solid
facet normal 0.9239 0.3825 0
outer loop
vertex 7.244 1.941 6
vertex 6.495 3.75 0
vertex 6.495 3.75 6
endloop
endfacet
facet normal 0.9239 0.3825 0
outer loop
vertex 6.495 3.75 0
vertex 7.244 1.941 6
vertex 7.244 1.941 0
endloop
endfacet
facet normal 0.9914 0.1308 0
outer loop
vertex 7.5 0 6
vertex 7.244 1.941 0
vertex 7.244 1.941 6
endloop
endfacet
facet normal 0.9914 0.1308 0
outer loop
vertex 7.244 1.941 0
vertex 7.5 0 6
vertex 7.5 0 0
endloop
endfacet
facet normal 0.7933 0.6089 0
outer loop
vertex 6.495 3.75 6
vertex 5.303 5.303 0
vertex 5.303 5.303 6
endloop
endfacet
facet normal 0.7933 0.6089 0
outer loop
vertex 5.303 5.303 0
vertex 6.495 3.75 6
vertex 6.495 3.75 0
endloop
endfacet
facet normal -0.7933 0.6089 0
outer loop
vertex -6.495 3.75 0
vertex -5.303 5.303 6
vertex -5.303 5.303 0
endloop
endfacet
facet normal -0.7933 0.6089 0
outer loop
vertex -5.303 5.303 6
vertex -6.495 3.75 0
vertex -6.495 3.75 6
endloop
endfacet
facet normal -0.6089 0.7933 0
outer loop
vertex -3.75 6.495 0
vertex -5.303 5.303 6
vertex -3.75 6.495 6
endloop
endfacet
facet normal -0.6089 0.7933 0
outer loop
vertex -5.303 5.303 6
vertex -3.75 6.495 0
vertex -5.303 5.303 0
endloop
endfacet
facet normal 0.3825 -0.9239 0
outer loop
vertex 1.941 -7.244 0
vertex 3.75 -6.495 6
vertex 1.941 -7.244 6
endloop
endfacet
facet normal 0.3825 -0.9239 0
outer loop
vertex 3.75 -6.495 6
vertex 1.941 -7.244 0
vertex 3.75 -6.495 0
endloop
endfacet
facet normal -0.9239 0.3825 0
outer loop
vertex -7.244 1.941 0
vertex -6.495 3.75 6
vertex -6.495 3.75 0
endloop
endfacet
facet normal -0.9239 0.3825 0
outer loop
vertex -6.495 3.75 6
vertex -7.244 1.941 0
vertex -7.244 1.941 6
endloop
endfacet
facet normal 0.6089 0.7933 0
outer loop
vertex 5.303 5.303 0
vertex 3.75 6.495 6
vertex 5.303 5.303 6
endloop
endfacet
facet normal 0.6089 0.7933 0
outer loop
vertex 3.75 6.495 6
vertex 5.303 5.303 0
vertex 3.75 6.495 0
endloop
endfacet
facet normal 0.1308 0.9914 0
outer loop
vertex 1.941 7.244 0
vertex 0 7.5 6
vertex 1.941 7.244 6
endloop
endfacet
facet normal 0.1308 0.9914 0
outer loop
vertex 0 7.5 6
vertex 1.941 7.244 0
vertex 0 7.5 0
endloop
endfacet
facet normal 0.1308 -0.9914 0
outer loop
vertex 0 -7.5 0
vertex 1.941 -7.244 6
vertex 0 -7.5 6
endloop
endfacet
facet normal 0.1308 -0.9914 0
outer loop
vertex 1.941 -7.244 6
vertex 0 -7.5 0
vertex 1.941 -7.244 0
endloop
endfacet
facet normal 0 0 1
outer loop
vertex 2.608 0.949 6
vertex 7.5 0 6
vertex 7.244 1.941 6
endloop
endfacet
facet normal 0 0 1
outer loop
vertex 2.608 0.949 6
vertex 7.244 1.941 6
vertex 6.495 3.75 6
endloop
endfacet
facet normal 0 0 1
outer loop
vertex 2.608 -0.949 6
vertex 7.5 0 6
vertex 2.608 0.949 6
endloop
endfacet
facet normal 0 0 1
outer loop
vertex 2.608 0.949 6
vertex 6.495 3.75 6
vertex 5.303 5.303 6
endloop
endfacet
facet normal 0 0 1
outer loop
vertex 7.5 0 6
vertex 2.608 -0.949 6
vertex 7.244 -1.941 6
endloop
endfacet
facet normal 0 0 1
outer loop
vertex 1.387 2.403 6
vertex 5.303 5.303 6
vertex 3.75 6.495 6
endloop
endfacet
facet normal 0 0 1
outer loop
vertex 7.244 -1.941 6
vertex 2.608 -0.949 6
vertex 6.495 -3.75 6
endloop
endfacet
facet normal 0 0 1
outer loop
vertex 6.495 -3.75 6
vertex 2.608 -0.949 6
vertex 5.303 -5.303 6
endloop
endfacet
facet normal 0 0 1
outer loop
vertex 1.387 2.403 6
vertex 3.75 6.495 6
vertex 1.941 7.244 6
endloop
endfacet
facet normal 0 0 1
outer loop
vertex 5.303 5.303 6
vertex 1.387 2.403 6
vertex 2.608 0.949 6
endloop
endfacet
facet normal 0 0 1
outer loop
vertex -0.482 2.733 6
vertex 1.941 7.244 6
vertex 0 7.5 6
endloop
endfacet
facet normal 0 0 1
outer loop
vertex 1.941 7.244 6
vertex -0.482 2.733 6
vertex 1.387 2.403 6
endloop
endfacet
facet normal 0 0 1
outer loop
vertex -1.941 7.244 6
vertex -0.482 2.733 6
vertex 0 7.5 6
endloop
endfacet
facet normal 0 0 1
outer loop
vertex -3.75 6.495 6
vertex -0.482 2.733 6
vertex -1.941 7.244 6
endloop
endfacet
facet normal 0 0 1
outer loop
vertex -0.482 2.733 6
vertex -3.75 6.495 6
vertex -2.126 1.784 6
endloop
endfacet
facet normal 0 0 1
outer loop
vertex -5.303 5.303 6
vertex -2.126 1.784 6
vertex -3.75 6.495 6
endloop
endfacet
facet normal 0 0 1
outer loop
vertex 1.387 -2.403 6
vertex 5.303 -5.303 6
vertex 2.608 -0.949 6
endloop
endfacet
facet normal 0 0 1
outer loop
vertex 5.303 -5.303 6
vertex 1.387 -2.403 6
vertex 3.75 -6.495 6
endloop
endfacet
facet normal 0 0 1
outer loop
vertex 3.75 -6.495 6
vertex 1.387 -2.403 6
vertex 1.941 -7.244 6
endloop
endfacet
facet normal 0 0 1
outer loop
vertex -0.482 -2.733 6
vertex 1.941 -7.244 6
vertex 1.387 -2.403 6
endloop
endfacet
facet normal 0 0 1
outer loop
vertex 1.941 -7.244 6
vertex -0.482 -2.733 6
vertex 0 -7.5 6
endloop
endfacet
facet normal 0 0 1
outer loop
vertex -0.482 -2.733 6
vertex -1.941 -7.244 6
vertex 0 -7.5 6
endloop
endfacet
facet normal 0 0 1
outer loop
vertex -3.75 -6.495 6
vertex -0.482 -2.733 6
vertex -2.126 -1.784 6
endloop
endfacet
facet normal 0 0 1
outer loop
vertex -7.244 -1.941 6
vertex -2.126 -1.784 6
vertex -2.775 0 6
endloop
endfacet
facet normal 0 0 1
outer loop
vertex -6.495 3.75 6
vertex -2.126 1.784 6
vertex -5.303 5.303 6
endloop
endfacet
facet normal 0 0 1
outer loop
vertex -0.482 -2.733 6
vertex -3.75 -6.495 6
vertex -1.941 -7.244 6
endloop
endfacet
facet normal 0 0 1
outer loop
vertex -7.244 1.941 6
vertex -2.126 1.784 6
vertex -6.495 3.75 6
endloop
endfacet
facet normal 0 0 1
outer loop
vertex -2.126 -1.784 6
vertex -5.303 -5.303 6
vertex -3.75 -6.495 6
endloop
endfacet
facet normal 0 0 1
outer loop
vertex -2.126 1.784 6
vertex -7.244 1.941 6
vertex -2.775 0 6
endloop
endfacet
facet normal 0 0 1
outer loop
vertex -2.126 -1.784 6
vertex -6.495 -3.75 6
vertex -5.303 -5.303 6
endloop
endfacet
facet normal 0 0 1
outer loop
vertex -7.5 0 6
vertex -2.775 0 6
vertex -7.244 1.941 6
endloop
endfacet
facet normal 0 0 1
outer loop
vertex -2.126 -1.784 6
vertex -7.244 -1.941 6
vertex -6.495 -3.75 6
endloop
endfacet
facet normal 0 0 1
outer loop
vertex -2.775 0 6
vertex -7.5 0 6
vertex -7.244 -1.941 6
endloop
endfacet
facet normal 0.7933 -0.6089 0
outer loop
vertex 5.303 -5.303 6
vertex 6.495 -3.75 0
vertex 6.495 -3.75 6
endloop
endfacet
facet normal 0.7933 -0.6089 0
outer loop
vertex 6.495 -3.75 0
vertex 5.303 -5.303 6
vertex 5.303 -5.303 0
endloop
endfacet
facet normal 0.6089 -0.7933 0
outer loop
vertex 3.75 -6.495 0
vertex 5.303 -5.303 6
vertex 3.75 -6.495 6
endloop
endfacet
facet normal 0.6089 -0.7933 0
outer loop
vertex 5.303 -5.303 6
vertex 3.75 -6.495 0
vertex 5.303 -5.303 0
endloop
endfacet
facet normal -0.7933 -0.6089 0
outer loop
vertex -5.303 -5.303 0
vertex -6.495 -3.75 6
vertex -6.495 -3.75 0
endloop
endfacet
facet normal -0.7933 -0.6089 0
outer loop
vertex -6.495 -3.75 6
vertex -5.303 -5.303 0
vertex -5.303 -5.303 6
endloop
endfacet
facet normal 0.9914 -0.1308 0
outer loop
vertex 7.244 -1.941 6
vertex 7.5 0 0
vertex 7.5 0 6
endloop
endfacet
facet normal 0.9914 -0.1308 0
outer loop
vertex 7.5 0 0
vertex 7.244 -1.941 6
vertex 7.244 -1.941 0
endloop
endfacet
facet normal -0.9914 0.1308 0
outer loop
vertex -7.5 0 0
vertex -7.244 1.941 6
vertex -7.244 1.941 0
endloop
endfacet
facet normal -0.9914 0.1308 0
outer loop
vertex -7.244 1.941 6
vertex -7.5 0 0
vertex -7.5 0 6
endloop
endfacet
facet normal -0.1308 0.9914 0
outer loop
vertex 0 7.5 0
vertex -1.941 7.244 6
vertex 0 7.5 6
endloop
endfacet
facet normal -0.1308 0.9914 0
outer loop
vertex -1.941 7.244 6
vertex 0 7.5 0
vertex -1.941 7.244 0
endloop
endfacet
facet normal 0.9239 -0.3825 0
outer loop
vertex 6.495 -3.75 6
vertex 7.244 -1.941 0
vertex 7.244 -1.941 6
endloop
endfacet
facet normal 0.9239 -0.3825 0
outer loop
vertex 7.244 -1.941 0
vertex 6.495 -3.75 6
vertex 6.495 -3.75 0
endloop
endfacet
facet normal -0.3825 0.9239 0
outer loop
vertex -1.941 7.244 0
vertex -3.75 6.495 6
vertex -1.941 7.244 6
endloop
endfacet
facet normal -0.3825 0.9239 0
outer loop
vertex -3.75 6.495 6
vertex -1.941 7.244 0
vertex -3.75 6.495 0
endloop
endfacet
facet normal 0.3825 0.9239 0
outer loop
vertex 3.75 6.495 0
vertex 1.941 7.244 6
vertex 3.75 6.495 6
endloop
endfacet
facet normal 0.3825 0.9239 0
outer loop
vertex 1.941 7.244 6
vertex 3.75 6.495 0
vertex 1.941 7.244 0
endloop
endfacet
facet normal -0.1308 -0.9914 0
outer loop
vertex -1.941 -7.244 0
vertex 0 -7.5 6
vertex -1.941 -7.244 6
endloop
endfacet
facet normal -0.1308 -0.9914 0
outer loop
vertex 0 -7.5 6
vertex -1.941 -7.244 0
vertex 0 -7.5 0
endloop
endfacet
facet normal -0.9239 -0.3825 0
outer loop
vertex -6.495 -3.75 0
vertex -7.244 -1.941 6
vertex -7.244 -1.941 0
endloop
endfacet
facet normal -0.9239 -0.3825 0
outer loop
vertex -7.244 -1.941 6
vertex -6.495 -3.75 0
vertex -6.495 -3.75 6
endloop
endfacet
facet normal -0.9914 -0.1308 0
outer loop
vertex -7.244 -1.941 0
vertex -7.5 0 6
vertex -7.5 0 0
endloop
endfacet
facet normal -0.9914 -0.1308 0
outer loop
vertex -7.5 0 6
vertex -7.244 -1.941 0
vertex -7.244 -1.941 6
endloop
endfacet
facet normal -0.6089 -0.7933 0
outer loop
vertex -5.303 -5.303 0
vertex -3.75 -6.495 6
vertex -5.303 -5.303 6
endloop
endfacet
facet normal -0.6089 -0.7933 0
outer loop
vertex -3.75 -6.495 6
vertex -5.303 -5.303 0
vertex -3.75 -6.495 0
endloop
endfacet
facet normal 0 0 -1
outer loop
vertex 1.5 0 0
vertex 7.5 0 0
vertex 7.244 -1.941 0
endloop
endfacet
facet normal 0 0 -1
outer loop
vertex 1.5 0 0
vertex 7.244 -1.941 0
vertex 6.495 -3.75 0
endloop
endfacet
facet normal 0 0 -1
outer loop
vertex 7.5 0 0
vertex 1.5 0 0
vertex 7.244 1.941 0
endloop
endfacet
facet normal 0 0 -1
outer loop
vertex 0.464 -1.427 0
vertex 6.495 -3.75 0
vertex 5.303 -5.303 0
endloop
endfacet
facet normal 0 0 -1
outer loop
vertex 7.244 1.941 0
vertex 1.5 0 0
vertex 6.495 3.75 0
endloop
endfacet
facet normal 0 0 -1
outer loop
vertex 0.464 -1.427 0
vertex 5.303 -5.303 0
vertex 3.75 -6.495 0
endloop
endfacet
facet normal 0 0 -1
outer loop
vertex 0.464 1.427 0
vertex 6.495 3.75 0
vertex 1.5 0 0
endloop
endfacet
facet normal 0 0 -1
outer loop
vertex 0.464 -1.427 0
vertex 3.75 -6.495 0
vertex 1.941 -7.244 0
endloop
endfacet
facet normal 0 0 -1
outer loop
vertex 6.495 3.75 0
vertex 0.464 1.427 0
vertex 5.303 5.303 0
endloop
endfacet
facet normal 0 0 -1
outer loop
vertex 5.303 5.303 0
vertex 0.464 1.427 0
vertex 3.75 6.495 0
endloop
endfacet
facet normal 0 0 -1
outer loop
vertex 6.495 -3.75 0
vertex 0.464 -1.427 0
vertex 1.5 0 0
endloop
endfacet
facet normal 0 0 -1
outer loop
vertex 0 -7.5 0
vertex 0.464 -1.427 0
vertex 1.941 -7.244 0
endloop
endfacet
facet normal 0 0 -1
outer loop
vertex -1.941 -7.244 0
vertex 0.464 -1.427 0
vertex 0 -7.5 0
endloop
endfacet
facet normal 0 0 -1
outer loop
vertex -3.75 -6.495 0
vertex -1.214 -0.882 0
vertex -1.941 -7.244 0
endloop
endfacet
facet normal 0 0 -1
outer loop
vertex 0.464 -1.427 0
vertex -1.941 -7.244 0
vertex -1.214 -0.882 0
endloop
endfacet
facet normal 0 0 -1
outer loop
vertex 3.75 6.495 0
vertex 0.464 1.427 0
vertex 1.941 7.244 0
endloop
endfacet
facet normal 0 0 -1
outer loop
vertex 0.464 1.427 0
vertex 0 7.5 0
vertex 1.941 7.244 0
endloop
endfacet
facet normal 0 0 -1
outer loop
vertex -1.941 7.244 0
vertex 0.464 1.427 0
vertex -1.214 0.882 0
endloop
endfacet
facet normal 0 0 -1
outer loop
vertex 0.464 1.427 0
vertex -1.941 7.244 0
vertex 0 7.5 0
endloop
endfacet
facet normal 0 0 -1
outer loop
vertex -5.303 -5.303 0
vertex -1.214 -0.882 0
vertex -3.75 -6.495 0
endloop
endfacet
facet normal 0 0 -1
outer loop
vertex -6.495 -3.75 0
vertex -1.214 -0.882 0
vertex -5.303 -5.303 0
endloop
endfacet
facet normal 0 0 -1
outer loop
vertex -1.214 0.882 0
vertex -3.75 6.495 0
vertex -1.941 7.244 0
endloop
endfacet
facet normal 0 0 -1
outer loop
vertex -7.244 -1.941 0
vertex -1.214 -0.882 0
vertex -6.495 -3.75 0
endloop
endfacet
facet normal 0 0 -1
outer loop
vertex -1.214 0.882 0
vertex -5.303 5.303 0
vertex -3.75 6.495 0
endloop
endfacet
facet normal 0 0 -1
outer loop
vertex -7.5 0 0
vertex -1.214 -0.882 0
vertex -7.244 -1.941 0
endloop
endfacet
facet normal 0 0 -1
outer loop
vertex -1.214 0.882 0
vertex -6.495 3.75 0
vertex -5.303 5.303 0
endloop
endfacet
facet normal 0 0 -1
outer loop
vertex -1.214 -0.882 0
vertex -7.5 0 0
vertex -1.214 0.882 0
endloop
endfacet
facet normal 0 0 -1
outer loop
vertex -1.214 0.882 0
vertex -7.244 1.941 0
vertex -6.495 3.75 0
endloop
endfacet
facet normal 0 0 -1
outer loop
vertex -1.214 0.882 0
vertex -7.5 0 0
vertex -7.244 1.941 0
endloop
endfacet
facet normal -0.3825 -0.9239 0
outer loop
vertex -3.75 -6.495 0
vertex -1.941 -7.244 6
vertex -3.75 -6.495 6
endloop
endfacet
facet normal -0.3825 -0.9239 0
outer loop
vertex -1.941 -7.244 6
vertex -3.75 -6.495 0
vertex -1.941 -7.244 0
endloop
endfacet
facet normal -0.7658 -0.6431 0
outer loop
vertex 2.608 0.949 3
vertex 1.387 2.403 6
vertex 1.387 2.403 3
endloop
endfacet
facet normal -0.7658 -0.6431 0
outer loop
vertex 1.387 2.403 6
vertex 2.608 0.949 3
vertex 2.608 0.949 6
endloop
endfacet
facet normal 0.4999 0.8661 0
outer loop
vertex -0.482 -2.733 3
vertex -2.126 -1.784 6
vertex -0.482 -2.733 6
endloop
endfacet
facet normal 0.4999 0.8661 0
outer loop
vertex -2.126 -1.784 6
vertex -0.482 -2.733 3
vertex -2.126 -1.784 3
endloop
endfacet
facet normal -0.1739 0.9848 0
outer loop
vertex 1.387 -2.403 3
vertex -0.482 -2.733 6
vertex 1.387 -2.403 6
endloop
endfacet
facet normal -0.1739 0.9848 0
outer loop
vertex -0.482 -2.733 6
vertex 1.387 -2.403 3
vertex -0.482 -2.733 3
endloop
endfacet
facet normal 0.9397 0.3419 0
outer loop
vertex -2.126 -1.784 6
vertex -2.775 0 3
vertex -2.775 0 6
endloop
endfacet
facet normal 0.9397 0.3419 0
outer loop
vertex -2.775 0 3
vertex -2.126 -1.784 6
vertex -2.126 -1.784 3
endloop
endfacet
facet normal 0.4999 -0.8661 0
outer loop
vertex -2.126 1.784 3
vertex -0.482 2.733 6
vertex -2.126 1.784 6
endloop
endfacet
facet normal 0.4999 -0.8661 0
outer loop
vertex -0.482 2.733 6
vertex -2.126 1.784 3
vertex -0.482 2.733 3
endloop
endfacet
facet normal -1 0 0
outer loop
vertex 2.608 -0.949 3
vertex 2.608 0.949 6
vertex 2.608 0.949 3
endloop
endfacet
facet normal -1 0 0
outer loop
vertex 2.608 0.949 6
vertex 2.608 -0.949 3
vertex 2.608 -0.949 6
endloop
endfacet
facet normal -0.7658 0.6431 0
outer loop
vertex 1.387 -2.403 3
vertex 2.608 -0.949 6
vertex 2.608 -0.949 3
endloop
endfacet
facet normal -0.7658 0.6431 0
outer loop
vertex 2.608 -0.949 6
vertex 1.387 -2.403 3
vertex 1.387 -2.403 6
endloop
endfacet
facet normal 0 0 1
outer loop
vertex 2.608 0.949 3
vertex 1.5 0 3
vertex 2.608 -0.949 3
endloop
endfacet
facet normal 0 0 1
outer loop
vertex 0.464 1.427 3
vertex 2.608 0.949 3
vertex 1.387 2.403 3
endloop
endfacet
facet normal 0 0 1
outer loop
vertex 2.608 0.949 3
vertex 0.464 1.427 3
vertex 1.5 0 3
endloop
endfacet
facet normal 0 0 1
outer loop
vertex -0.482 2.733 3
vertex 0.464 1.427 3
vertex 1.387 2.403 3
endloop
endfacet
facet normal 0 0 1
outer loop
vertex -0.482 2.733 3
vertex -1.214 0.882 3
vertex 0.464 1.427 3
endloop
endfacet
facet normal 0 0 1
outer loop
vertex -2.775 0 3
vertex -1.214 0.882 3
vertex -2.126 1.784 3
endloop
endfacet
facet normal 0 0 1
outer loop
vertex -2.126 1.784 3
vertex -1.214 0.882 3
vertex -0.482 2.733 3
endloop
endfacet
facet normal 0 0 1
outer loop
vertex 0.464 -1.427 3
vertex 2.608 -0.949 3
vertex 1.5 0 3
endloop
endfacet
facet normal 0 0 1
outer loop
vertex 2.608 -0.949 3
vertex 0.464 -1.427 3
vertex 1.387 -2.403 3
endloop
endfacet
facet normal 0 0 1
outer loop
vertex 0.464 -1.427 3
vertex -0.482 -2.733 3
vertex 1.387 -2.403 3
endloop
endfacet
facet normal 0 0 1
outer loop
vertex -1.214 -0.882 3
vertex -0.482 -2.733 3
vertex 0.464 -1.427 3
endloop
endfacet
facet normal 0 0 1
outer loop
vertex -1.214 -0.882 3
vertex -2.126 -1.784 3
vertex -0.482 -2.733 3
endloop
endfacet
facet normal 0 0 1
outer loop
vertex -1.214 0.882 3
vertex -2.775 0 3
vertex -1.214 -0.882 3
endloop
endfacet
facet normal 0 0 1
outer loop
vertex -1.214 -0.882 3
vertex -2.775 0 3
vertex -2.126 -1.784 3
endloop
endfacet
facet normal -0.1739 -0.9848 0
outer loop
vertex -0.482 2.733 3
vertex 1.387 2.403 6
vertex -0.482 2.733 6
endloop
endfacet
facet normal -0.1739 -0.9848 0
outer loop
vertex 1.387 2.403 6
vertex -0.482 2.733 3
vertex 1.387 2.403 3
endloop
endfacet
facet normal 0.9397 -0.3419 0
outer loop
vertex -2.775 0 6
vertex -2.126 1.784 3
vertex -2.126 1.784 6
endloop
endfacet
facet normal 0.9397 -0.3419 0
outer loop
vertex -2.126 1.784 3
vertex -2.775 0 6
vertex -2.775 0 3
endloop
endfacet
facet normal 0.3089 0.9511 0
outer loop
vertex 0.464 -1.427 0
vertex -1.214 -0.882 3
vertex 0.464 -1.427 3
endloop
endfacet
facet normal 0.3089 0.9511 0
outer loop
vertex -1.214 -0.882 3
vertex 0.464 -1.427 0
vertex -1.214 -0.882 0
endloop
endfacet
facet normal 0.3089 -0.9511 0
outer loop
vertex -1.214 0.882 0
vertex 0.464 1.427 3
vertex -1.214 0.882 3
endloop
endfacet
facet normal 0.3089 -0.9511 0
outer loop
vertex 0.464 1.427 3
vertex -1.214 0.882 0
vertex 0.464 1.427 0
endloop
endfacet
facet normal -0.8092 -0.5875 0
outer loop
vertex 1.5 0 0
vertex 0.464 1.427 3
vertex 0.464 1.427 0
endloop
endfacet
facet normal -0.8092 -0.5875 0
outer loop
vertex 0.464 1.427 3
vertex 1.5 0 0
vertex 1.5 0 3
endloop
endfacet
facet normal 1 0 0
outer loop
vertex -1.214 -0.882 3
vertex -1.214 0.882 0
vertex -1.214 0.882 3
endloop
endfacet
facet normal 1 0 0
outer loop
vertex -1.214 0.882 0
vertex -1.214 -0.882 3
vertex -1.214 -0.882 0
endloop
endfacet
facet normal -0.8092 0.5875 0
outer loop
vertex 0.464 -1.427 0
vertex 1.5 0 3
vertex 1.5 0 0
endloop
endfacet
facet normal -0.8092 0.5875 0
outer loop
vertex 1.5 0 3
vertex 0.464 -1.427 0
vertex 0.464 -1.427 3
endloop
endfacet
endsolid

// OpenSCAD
thickness=6;
diameter = 15;
servoGripDiameter = 4.75;
servoGripDepth = 3;
screwHoleDiameter = 3;

difference() {
	cylinder(r=diameter/2, h=thickness);

	// Hole to grip the servo
	rotate([0,0,180]) // flip over
		translate([0, 0, thickness-servoGripDepth]) // back off the height of the hole
			#cylinder(r= (servoGripDiameter +.8)/2, h=servoGripDepth); // drill baby drill
		
	// Screw hole
	#cylinder(r=screwHoleDiameter/2, h=thickness);

}
